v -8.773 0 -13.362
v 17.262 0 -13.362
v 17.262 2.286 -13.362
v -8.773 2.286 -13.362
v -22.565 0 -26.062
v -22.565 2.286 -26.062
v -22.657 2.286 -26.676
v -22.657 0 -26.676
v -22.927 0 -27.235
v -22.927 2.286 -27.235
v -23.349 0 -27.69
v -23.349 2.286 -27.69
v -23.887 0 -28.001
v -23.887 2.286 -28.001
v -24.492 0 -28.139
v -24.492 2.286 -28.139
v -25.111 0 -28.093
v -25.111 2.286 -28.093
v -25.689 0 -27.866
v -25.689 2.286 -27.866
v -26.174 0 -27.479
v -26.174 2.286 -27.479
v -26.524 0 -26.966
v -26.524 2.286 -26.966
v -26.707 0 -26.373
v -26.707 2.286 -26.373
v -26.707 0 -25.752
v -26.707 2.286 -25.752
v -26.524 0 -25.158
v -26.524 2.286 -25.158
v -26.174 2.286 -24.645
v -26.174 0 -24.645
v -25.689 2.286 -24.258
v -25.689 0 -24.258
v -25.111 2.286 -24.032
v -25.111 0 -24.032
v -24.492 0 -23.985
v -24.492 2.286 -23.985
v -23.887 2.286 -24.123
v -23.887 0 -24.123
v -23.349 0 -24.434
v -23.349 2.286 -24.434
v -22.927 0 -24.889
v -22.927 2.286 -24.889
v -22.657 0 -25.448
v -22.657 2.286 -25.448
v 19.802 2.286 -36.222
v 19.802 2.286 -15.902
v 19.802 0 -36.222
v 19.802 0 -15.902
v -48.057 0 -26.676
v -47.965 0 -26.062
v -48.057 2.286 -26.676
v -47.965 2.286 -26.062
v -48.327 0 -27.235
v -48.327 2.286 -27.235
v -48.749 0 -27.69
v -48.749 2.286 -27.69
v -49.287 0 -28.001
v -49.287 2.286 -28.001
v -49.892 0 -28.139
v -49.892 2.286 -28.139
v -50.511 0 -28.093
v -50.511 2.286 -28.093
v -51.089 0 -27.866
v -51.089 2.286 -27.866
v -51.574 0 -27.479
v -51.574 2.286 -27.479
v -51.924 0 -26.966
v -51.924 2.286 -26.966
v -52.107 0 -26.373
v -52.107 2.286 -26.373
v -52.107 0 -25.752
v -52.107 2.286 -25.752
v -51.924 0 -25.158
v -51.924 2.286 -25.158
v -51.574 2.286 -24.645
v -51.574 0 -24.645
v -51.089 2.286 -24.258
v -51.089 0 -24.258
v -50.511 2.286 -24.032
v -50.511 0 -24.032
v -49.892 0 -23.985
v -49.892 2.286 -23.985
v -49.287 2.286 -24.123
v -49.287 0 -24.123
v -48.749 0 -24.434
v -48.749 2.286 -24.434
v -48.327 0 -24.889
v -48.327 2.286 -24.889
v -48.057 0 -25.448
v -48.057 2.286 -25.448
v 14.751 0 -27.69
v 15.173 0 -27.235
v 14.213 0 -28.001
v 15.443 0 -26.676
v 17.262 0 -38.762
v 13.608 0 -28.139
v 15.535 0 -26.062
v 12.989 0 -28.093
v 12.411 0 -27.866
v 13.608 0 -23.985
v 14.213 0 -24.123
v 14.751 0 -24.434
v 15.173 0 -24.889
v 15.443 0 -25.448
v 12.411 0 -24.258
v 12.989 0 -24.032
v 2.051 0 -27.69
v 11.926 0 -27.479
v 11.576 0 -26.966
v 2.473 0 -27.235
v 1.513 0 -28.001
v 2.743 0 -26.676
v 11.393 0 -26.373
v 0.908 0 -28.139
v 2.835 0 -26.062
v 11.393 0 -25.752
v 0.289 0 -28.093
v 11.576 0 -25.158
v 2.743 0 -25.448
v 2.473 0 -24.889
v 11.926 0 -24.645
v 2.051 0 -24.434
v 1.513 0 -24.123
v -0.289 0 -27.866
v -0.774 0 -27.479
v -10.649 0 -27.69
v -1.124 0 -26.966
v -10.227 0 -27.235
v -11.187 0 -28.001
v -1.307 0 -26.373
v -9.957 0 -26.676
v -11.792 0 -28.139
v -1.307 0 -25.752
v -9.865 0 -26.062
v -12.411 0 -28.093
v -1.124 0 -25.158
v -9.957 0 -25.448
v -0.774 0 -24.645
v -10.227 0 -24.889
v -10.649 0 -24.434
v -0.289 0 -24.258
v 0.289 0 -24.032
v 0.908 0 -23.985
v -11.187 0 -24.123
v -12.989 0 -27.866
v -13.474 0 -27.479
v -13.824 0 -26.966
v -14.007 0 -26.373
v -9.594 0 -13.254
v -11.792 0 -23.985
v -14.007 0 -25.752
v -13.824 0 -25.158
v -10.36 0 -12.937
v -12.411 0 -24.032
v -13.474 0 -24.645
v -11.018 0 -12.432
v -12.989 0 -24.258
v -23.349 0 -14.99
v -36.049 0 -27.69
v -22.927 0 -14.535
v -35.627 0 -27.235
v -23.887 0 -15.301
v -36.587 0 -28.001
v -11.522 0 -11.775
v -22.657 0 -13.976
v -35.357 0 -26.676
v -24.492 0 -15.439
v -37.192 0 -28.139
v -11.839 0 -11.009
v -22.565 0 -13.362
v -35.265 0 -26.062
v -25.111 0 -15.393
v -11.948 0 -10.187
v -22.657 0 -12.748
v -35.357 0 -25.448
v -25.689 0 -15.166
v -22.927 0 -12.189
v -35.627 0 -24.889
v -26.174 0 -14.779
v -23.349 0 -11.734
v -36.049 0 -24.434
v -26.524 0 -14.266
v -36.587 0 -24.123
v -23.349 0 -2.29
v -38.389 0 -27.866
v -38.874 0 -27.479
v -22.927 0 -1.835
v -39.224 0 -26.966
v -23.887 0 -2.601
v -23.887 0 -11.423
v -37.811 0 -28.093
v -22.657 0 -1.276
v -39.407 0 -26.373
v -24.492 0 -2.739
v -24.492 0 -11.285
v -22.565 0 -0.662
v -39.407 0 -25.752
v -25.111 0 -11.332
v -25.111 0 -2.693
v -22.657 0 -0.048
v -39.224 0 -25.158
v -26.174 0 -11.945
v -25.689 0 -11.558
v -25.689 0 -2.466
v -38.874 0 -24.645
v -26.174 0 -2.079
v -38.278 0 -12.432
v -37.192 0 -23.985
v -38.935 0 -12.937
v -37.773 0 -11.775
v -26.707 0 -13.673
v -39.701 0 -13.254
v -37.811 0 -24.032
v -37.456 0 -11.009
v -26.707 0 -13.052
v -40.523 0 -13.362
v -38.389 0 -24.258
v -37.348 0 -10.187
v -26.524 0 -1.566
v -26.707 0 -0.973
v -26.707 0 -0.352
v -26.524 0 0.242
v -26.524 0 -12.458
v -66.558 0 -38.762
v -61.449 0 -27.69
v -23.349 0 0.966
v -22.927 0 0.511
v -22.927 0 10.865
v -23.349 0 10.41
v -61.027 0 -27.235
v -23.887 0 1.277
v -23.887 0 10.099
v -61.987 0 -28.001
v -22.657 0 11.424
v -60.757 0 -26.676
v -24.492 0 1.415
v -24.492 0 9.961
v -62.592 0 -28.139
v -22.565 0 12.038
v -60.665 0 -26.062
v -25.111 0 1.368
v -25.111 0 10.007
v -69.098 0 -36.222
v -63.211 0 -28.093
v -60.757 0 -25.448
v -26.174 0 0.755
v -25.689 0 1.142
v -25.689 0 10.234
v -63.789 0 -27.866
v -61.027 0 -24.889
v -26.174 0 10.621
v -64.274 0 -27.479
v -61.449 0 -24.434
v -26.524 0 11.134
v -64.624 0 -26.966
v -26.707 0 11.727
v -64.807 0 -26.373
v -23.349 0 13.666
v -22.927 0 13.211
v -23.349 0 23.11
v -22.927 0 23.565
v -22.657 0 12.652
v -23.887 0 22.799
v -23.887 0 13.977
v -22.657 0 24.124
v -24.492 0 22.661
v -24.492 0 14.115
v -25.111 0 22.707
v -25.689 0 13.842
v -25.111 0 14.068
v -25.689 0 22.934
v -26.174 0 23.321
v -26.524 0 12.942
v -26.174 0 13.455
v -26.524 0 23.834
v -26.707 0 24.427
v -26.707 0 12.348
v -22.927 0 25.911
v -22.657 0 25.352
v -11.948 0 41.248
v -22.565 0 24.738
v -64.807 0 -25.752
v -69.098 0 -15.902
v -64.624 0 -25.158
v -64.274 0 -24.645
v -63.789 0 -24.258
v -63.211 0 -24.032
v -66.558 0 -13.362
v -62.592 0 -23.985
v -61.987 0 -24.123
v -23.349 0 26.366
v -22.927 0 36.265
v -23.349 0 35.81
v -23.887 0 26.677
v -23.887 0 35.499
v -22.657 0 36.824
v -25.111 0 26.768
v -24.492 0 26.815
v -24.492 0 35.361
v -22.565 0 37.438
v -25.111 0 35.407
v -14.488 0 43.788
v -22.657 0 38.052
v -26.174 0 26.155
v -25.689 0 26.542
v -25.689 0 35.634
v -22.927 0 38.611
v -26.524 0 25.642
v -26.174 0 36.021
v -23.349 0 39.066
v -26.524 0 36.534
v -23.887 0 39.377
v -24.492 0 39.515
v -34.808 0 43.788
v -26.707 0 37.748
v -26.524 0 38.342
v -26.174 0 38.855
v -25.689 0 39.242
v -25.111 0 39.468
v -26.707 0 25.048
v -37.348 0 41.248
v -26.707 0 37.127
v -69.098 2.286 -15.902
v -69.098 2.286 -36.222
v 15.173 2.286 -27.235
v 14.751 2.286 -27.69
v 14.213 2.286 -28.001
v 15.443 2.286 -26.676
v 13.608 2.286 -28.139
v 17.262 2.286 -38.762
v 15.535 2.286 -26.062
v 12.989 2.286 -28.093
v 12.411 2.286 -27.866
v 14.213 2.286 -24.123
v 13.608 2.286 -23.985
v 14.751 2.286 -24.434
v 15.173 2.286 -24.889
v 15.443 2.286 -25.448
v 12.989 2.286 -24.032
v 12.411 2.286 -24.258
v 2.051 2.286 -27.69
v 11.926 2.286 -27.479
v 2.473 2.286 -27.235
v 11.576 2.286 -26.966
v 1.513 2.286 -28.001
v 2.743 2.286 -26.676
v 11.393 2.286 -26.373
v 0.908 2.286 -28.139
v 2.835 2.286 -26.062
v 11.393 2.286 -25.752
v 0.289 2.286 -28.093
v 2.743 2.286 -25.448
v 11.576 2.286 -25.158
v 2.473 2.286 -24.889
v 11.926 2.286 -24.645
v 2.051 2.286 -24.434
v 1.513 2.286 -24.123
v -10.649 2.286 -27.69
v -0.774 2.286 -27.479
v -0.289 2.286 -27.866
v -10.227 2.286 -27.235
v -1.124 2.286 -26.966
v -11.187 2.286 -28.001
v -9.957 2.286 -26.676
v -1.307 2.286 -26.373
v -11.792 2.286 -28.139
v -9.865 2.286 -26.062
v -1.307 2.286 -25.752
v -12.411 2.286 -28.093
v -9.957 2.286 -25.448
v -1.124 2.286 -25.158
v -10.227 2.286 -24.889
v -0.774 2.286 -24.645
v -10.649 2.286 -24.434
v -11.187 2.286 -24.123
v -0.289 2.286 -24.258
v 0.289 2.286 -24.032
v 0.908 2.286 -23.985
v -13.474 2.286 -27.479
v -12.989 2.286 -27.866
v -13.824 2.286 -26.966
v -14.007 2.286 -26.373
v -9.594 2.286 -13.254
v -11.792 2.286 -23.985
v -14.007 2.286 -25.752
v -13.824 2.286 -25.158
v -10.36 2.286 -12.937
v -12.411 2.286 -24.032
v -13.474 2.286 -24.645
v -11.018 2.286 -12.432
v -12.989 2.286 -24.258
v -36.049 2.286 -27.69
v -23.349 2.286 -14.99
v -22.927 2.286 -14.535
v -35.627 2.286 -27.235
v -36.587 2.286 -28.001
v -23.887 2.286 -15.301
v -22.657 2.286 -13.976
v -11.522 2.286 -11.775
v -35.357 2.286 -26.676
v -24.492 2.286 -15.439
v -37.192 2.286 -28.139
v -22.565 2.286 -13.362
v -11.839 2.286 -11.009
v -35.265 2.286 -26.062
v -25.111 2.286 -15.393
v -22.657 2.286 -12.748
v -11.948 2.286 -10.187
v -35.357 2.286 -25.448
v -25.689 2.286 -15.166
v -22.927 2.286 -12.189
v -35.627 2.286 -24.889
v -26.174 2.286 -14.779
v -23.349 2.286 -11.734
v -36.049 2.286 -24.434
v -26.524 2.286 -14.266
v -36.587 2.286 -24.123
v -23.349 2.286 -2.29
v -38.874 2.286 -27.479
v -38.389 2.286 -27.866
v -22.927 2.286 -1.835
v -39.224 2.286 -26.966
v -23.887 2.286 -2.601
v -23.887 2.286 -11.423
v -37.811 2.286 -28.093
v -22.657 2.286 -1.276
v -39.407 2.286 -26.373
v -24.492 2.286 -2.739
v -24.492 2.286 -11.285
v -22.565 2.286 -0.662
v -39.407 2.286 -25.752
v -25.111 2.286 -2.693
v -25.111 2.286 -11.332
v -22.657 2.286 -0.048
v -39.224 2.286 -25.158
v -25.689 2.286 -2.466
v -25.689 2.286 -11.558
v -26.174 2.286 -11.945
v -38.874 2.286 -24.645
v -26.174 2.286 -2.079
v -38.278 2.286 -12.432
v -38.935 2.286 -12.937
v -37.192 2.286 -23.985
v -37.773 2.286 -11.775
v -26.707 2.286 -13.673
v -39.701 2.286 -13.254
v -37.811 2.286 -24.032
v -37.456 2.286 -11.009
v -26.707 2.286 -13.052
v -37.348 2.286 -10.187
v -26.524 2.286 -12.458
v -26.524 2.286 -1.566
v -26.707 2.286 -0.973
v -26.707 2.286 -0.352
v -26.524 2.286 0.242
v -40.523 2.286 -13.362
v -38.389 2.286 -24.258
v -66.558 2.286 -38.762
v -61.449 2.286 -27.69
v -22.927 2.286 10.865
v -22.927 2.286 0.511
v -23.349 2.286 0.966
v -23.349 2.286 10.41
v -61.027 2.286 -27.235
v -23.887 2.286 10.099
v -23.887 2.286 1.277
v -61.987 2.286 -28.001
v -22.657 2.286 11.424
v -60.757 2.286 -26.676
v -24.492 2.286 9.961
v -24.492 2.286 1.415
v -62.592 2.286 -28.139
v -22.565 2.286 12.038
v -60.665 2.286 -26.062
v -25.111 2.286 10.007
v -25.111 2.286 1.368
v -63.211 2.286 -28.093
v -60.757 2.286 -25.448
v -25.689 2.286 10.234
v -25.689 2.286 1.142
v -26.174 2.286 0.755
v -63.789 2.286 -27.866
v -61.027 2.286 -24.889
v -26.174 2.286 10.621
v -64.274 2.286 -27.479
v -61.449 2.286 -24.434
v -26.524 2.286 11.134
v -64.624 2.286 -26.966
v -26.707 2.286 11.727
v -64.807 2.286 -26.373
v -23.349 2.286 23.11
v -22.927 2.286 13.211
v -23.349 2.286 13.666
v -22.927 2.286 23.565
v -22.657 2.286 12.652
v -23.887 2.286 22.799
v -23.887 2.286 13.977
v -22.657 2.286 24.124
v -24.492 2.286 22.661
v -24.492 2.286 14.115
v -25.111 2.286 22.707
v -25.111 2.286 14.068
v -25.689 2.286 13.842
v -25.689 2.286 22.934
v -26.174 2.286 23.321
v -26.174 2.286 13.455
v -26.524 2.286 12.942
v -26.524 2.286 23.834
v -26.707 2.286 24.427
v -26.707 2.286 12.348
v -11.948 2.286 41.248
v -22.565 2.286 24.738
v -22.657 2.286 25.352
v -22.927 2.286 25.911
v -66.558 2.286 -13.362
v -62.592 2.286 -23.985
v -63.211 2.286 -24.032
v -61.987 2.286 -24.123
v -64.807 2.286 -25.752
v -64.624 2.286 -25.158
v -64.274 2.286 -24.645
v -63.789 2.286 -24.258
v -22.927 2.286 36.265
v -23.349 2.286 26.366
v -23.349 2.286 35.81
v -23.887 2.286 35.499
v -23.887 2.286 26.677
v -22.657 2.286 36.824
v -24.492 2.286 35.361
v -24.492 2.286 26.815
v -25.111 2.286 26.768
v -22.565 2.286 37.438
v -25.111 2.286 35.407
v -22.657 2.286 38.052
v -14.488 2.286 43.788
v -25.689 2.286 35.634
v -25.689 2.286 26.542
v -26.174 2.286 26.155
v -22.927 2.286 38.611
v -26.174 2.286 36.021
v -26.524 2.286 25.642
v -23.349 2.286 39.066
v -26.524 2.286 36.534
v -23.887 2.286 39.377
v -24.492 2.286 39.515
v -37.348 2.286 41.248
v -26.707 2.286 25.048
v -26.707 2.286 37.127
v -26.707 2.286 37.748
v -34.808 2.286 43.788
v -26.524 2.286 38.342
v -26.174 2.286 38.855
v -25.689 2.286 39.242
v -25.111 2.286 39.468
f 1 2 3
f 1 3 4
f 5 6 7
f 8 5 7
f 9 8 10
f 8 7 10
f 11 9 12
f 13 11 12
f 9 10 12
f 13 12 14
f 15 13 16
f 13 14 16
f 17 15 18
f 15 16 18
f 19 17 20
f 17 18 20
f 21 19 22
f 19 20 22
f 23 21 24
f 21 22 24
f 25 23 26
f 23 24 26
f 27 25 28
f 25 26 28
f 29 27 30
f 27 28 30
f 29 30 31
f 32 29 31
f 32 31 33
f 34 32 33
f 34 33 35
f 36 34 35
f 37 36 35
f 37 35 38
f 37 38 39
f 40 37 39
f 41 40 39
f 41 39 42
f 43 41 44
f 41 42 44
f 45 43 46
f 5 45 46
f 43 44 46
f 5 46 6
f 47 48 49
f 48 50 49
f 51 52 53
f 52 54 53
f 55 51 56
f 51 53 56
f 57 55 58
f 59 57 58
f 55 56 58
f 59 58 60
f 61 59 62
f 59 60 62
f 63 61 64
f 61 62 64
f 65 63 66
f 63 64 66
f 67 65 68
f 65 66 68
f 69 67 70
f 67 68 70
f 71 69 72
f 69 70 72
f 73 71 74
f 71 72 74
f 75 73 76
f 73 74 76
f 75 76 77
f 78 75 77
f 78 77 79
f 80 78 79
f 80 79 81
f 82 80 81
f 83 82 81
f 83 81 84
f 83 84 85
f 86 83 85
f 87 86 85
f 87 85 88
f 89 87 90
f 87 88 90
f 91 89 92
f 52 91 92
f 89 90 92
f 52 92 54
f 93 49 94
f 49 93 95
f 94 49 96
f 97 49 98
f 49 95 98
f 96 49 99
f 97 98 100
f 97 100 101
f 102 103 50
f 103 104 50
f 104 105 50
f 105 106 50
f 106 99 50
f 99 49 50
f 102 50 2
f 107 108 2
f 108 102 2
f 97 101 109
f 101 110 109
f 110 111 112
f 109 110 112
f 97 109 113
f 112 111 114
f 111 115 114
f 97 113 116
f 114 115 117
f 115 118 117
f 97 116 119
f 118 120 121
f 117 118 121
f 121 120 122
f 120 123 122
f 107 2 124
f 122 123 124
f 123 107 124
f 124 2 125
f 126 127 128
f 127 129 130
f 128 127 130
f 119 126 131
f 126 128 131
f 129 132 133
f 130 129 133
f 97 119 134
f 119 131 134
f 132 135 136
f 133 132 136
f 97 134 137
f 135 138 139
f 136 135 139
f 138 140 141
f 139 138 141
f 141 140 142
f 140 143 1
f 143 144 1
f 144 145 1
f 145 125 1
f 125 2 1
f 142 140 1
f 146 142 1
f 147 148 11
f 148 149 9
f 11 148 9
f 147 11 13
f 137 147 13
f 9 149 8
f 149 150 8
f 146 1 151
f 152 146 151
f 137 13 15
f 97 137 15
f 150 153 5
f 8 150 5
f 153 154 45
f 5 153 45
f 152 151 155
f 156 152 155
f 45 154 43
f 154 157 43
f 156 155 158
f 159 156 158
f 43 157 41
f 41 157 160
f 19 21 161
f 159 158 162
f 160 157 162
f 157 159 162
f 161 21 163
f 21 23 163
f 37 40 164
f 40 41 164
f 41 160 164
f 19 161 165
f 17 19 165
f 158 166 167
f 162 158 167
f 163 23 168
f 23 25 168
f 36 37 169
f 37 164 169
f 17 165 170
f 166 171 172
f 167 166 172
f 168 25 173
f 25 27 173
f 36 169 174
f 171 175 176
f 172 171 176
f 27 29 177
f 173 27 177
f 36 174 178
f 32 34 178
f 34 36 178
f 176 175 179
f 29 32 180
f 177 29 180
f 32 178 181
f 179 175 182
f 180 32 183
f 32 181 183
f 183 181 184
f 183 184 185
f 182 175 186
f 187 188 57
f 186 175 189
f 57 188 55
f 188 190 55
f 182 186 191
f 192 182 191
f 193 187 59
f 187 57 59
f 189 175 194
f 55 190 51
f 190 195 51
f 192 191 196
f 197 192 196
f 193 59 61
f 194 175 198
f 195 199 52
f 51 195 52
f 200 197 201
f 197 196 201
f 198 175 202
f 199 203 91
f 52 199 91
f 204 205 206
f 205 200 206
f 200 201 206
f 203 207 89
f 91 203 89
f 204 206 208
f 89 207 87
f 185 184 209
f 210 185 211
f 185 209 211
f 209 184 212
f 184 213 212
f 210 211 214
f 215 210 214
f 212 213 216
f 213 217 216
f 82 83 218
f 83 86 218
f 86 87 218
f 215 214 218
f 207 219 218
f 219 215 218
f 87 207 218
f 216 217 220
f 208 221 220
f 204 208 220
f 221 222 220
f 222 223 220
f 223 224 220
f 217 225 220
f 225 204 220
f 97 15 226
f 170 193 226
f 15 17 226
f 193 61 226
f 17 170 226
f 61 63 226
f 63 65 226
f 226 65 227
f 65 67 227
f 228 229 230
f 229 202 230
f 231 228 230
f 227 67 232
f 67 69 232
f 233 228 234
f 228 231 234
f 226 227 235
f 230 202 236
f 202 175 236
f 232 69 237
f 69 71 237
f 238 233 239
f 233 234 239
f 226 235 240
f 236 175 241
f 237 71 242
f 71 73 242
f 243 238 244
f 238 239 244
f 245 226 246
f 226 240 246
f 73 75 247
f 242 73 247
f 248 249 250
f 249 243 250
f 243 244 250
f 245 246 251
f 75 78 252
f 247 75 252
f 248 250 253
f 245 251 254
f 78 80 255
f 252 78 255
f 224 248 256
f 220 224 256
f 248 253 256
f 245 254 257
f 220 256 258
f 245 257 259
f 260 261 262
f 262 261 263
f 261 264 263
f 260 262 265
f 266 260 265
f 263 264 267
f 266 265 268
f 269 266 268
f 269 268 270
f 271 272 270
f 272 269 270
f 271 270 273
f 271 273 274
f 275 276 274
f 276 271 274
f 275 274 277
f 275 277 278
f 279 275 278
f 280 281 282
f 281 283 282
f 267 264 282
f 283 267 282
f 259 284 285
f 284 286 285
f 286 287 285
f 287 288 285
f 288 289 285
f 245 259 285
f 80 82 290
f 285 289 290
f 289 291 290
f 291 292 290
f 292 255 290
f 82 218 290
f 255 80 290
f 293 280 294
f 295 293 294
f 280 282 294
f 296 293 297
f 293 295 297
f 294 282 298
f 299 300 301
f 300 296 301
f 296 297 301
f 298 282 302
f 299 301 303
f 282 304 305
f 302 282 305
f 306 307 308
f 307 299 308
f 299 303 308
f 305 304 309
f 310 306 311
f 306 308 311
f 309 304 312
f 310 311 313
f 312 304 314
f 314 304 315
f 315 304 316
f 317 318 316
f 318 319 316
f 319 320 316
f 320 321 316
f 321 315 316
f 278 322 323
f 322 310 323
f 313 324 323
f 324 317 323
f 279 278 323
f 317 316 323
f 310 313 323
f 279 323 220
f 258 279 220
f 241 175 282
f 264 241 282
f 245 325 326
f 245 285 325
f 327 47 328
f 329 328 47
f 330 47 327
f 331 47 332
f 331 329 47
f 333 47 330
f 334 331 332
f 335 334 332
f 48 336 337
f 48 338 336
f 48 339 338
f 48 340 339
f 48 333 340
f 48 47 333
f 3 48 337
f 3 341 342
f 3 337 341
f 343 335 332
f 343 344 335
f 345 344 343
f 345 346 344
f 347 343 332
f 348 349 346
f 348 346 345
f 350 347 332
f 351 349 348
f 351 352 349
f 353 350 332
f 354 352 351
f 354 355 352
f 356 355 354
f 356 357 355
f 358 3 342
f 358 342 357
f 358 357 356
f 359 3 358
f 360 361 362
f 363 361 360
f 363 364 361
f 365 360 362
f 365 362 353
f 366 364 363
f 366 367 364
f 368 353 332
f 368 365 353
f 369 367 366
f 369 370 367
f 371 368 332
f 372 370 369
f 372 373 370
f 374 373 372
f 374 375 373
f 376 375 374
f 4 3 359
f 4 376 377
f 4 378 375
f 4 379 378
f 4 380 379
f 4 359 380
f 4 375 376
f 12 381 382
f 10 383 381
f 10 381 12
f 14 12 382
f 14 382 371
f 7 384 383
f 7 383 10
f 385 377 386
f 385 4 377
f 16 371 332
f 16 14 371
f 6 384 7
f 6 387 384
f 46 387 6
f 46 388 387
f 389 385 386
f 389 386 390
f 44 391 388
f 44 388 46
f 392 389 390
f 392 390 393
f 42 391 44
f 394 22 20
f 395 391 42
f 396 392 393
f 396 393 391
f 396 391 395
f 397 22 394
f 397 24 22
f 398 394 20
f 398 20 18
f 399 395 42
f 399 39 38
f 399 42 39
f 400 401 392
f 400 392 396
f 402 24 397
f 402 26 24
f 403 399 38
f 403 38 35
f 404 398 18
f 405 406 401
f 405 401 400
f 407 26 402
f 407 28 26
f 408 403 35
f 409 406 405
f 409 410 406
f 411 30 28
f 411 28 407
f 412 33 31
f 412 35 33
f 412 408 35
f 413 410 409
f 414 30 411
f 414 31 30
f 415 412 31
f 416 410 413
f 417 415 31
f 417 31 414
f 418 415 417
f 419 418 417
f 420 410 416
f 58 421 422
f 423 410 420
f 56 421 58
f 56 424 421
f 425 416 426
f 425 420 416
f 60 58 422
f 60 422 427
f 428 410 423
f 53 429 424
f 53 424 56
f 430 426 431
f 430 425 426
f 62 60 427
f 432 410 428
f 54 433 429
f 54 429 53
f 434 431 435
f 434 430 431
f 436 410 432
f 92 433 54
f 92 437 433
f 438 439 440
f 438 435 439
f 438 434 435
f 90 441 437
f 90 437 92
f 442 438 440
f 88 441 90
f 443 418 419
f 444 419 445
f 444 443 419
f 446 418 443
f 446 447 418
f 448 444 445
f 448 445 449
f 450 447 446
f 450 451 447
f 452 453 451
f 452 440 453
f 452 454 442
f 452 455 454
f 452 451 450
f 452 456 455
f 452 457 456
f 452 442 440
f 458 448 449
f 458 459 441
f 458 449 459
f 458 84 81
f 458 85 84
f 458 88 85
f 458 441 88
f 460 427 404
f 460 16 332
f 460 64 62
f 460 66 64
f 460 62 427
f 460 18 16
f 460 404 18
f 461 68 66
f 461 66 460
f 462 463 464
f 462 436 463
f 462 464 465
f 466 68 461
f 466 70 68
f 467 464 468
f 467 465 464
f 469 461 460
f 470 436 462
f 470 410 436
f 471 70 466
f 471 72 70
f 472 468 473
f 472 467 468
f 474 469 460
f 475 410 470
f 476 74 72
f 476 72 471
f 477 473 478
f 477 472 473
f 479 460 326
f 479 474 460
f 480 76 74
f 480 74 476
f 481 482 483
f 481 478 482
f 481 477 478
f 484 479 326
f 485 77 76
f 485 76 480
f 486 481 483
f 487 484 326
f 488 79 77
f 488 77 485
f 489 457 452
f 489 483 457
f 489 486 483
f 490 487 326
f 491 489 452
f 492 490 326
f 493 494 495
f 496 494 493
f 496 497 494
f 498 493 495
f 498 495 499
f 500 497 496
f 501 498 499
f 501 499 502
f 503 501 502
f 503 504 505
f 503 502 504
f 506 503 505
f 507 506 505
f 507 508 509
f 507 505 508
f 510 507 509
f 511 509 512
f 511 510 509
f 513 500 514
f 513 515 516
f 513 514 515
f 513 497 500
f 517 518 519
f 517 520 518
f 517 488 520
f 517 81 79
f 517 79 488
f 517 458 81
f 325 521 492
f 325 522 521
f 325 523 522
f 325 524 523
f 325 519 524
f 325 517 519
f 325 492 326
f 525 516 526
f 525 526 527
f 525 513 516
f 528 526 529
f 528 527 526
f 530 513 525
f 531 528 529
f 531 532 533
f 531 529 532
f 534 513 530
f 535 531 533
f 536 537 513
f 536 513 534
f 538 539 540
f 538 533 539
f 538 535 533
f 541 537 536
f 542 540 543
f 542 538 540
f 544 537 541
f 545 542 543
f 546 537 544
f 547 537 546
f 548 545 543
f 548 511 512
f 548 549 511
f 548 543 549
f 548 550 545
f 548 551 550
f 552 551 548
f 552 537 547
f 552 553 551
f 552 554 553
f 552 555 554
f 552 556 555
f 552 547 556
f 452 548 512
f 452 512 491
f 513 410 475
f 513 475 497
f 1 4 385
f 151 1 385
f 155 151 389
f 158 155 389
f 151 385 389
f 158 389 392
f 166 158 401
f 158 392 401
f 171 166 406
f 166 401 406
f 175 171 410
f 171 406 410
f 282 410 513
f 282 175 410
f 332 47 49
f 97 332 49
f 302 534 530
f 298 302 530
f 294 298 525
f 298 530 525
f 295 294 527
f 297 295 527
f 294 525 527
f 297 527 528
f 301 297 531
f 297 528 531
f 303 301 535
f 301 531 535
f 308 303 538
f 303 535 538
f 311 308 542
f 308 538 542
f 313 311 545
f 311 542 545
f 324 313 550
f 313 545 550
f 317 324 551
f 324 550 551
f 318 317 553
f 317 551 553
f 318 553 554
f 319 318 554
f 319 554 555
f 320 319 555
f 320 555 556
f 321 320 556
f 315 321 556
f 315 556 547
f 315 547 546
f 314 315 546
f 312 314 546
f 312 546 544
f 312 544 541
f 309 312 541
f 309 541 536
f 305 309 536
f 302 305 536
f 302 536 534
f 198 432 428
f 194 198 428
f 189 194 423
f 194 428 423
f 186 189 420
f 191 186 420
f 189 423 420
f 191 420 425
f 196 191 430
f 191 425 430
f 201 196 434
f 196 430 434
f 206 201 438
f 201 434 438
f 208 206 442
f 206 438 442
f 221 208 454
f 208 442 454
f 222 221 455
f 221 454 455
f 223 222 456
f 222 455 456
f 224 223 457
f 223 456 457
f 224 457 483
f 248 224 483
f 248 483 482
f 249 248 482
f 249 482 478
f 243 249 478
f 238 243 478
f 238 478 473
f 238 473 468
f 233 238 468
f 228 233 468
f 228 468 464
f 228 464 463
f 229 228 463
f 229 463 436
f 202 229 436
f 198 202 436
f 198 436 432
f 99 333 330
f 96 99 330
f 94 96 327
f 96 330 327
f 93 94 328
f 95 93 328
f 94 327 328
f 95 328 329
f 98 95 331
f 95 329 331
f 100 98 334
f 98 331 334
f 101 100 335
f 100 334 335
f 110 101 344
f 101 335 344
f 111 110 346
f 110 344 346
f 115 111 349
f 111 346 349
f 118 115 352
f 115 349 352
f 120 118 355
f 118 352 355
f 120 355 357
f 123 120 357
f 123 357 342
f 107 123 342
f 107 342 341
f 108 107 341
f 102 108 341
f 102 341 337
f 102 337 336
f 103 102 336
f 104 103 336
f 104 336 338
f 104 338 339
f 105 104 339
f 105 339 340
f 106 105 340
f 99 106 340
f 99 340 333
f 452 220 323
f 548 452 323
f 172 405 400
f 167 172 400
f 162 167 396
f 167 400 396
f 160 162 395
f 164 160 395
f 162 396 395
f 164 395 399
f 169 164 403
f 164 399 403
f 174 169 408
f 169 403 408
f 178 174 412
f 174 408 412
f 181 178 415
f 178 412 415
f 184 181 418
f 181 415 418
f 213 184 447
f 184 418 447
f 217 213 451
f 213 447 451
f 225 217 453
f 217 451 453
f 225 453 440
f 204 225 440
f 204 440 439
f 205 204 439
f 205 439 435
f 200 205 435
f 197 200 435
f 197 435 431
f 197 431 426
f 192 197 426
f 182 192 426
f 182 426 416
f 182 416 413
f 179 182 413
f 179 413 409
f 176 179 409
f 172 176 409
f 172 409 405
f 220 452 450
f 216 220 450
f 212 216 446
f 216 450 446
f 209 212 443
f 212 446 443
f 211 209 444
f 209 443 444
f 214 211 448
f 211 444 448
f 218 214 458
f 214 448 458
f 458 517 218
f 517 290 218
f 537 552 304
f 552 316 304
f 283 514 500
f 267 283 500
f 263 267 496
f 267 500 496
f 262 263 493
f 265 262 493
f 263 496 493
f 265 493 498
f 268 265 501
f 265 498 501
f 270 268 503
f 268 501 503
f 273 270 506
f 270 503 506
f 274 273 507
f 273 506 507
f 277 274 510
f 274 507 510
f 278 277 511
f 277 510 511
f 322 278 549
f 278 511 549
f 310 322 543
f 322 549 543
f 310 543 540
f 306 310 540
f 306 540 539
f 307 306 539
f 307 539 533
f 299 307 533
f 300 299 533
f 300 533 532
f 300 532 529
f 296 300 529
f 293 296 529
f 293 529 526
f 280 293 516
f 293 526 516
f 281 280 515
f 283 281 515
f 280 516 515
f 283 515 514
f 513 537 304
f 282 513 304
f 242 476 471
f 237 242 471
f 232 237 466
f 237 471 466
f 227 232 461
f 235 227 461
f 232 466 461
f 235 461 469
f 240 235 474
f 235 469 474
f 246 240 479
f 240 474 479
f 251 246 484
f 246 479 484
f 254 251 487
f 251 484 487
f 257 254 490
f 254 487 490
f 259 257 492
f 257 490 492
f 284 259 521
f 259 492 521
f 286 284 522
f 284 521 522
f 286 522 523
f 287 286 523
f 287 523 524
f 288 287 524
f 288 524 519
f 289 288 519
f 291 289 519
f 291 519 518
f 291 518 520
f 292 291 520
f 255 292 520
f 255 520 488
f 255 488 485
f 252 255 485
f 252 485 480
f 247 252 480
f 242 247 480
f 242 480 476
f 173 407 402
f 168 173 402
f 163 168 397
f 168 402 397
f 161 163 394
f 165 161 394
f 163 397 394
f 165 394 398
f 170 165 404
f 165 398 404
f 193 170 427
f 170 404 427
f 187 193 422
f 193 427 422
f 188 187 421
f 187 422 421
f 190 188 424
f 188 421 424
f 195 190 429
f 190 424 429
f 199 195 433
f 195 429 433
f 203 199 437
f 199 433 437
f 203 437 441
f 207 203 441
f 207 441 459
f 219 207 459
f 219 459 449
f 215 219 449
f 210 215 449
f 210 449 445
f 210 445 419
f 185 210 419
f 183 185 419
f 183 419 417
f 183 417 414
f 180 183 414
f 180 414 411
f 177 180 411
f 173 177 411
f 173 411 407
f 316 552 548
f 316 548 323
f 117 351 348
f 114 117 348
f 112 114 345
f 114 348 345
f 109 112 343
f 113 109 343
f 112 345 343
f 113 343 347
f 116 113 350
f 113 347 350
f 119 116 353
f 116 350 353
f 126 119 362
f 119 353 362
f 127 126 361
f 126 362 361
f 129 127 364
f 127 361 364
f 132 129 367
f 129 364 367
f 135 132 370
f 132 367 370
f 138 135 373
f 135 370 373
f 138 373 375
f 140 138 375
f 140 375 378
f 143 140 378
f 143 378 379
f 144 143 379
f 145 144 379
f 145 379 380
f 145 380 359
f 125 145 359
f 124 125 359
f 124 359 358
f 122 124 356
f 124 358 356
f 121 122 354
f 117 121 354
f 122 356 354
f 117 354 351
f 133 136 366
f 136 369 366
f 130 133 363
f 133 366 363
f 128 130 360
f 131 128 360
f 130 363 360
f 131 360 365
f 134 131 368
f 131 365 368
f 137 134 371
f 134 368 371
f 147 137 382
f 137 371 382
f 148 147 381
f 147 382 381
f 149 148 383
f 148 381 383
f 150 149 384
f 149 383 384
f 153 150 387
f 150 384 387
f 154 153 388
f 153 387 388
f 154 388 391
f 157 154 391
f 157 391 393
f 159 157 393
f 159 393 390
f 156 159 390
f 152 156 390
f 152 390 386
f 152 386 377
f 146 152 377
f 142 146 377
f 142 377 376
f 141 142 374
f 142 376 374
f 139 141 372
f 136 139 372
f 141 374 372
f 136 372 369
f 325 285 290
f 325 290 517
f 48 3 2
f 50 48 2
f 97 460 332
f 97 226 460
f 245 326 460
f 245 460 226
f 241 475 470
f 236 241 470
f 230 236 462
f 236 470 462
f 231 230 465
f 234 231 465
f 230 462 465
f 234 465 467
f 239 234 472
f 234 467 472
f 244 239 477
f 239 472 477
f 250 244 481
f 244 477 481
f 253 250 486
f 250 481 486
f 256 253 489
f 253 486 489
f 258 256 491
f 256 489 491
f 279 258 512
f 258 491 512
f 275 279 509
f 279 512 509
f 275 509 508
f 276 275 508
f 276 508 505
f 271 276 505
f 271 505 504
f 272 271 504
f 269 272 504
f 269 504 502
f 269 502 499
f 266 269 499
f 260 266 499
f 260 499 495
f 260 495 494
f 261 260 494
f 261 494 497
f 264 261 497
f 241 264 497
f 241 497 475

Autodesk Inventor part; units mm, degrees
ref_plane "YZ Plane" through (0, 0, 0) normal (1, 0, 0) x (0, 1, 0)
ref_plane "XZ Plane" through (0, 0, 0) normal (0, 1, 0) x (-1, 0, 0)
ref_plane "XY Plane" through (0, 0, 0) normal (0, 0, 1) x (1, 0, 0)
sketch "Sketch1" plane through (0, 0, 0) normal (0, 1, 0) x (-1, 0, 0)
  line L0 (69.0976, -38.7621) -> (24.6476, -38.7621)
  line L1 (69.0976, -13.3621) -> (69.0976, -38.7621)
  line L2 (24.6476, -38.7621) -> (41.922, -38.7621)
  line L3 (37.3476, 43.7879) -> (24.6476, 43.7879)
  line L4 (69.0976, -13.3621) -> (37.3476, -13.3621)
  line L5 (37.3476, -13.3621) -> (37.3476, 43.7879)
  line L6 (-19.8024, -38.7621) -> (24.6476, -38.7621)
  line L7 (-19.8024, -13.3621) -> (-19.8024, -38.7621)
  line L8 (24.6476, -38.7621) -> (7.3732, -38.7621)
  line L9 (11.9476, 43.7879) -> (24.6476, 43.7879)
  line L10 (-19.8024, -13.3621) -> (11.9476, -13.3621)
  line L11 (11.9476, -13.3621) -> (11.9476, 43.7879)
  point P0 (0, 0)
  dimension "d0" = 44.45
  dimension "d1" = 12.7
  dimension "d2" = 25.4
  dimension "d3" = 82.55
extrude "Extrusion1" add sketch "Sketch1" along normal blind 2.286
sketch "Sketch2" plane through (0, 2.286, 0) normal (0, 1, 0) x (1, 0, 0)
  circle A0 centre (-24.6476, 26.0621) radius 2.0828
  line L0 (19.8024, 38.7621) -> (-69.0976, 38.7621) projected
  line L1 (19.8024, 13.3621) -> (19.8024, 38.7621) projected
  point P0 (0, 0)
  dimension "d6" = 4.1656
  dimension "d7" = 12.7
  dimension "d8" = 44.45
extrude "Extrusion2" cut sketch "Sketch2" against normal blind 2.286
pattern_linear "Rectangular Pattern1" count 4 spacing 12.7 along (1, 0, 0) count 4 spacing 12.7 along (-1, 0, 0) of "Extrusion2"
pattern_linear "Rectangular Pattern2" count 6 spacing 12.7 along (0, 0, 1) of "Extrusion2"
chamfer "Chamfer1" distance 2.54 angle 45 6 edges at (-69.0976, 1.143, -13.3621) (-37.3476, 1.143, 43.7879) (-11.9476, 1.143, 43.7879) (19.8024, 1.143, -13.3621) (19.8024, 1.143, -38.7621) (-69.0976, 1.143, -38.7621)
fillet "Fillet1" radius 3.175 2 edges at (-37.3476, 1.143, -13.3621) (-11.9476, 1.143, -13.3621)
properties part number "TGusset Versa"
